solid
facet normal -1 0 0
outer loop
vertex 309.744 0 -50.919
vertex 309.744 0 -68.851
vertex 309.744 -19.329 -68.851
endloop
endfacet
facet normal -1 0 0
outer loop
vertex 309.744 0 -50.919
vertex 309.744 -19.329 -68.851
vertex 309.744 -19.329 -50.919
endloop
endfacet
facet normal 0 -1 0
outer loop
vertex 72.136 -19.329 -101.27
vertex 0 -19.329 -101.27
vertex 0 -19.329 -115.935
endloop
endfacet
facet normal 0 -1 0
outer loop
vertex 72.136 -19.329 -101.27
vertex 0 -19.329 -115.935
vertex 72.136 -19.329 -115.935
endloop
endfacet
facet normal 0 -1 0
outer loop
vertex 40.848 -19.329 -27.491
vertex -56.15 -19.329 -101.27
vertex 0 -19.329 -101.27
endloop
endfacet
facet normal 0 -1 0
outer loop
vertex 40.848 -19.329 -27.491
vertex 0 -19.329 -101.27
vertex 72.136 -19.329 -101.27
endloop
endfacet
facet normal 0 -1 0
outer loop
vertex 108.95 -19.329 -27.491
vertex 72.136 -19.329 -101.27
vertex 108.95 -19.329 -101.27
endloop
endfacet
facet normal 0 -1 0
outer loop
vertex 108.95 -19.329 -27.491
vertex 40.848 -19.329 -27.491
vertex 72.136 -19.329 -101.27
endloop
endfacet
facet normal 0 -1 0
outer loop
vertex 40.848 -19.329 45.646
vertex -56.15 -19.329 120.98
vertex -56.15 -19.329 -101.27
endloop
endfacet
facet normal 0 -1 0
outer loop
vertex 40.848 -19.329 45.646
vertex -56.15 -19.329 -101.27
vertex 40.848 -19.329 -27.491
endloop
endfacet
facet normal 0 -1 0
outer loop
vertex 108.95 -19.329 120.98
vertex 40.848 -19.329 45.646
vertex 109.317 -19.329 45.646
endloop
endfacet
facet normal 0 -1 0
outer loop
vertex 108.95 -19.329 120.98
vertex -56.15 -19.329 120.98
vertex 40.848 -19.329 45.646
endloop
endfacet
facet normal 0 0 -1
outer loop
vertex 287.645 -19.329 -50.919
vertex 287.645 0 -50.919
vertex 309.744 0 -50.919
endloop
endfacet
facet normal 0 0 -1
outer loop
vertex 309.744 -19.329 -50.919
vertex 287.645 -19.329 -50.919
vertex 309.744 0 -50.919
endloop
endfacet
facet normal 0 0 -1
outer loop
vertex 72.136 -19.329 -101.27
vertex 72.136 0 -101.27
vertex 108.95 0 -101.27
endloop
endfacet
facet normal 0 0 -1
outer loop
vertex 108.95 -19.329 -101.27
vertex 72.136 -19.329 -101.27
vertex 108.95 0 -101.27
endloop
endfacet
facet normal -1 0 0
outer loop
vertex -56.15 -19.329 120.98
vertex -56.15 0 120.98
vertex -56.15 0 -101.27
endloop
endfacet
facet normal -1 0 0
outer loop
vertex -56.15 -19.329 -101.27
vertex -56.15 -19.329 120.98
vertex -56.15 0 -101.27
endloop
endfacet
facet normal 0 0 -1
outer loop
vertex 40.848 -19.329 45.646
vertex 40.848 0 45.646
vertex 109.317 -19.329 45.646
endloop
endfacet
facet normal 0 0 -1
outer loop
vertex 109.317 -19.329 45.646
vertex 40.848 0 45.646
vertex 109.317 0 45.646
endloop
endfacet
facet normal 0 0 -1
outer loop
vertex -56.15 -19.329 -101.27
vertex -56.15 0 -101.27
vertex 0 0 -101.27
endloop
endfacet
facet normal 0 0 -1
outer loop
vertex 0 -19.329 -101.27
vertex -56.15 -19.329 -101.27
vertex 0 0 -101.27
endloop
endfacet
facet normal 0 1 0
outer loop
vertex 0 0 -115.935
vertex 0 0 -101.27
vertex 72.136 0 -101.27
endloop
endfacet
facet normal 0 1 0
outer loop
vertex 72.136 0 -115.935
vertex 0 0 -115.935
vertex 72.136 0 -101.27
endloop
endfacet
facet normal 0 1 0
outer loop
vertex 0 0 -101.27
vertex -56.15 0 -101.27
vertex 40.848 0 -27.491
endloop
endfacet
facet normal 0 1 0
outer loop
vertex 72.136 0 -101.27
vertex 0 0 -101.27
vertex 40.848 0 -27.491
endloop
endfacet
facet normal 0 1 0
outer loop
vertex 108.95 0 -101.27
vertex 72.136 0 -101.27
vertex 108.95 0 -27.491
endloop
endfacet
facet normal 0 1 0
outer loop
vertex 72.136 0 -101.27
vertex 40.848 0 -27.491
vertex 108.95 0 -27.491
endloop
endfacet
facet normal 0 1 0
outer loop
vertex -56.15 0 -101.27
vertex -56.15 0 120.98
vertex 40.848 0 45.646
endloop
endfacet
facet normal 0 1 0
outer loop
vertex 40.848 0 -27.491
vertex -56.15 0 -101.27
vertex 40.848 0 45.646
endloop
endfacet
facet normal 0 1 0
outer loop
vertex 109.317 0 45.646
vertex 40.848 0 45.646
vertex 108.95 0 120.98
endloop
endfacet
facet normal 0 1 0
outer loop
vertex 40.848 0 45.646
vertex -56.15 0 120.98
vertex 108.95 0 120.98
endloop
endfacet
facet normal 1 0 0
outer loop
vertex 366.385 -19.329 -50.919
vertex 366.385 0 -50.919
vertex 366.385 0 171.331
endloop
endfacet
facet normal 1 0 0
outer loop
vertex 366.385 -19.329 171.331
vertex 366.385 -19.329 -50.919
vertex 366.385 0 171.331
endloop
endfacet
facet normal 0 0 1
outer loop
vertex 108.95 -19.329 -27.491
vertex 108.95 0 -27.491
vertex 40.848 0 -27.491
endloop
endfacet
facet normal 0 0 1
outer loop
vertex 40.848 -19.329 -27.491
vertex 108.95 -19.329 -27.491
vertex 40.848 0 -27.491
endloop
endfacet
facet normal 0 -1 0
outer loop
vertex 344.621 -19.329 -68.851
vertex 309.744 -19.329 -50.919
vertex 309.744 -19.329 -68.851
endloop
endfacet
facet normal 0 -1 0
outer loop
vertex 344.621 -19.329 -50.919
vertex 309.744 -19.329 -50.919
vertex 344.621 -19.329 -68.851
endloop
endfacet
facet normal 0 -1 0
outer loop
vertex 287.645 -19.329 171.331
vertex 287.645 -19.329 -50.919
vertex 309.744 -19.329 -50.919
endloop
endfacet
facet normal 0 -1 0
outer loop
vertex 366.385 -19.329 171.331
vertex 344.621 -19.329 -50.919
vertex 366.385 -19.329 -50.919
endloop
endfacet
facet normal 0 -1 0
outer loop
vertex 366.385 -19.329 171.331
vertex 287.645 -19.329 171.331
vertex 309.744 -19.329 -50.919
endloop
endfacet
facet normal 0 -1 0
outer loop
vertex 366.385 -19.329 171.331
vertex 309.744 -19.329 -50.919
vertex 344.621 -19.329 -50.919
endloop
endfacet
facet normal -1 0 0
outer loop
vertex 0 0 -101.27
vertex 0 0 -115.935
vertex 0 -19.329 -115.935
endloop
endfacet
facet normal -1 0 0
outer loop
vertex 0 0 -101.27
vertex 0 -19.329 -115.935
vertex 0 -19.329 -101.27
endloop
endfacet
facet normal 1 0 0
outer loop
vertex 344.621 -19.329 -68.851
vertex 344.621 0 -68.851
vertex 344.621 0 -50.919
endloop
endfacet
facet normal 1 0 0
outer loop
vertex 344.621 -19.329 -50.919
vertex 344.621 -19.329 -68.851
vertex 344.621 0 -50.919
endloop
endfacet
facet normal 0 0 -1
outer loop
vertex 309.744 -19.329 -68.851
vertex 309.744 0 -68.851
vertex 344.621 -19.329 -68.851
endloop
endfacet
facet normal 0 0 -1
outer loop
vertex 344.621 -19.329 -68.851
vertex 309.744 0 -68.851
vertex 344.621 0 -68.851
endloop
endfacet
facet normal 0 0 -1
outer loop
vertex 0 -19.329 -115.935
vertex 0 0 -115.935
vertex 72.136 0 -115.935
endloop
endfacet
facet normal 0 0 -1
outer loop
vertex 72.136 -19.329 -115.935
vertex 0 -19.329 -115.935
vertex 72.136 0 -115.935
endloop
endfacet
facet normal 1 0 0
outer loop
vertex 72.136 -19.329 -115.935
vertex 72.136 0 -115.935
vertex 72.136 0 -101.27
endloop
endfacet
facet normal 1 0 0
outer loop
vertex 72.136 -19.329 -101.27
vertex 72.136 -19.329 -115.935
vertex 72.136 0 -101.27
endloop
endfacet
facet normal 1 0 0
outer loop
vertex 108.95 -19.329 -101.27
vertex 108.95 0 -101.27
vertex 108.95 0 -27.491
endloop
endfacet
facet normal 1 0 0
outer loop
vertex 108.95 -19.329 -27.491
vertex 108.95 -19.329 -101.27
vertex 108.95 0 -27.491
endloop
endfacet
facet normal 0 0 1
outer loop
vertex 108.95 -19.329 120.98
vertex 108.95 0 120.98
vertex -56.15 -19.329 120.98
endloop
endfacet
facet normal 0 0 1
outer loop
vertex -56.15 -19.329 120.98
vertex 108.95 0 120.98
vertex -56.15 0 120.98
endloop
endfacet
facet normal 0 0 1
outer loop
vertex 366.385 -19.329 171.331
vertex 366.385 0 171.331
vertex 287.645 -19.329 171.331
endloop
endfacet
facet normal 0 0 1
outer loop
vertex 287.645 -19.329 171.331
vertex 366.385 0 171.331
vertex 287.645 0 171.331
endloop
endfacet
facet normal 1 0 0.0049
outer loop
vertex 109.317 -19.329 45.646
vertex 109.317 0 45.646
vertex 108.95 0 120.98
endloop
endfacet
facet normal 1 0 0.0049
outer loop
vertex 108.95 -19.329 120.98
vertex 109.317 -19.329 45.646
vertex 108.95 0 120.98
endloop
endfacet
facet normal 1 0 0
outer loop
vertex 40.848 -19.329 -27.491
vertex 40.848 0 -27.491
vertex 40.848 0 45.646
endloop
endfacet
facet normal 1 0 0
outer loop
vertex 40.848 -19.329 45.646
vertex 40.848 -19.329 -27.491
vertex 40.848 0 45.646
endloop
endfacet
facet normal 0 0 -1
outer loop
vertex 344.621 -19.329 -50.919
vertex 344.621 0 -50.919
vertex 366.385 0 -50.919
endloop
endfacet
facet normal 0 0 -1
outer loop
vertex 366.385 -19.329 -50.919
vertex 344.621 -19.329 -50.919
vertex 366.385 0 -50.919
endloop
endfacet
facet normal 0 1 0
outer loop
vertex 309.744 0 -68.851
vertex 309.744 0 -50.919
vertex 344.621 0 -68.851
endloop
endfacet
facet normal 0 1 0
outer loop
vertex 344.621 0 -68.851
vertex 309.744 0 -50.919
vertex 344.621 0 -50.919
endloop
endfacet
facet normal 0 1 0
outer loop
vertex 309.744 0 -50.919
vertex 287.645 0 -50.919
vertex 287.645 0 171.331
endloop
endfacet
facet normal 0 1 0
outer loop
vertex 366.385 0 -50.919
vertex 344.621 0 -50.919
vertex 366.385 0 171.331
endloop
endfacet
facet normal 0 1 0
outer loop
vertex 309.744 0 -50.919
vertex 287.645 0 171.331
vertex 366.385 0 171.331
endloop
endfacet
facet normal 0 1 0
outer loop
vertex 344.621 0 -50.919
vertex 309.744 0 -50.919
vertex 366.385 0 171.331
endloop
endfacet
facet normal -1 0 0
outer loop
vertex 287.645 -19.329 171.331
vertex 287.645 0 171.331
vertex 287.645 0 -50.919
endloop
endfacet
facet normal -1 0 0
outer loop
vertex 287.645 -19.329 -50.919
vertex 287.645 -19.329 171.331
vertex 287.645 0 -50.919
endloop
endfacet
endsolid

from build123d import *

# Parameters (mm, degrees)
F0_W     = 72.136
F0_H     = 14.665074
F0_W_2   = 34.877121
F0_H_2   = 17.931667
F1_DEPTH = 19.3294


with BuildPart() as f1:
    # F0 (on Front) → F1 (new body)
    with BuildSketch(Plane.XZ):
        Polygon((108.950357, 120.980367), (-56.149643, 120.980367), (-56.149643, -101.269633), (0, -101.269633), (72.136, -101.269633), (108.950357, -101.269633), (108.950357, -27.491283), (40.84789, -27.491283), (40.84789, 45.645904), (109.316744, 45.645904), align=None)
        with Locations((36.068, -108.60217)):
            Rectangle(F0_W, F0_H)
        Polygon((287.645191, 171.33106), (287.645191, -50.91894), (309.743941, -50.91894), (344.621062, -50.91894), (366.385191, -50.91894), (366.385191, 171.33106), align=None)
        with Locations((327.182502, -59.884773)):
            Rectangle(F0_W_2, F0_H_2)
    extrude(amount=F1_DEPTH)


solid = f1.part
